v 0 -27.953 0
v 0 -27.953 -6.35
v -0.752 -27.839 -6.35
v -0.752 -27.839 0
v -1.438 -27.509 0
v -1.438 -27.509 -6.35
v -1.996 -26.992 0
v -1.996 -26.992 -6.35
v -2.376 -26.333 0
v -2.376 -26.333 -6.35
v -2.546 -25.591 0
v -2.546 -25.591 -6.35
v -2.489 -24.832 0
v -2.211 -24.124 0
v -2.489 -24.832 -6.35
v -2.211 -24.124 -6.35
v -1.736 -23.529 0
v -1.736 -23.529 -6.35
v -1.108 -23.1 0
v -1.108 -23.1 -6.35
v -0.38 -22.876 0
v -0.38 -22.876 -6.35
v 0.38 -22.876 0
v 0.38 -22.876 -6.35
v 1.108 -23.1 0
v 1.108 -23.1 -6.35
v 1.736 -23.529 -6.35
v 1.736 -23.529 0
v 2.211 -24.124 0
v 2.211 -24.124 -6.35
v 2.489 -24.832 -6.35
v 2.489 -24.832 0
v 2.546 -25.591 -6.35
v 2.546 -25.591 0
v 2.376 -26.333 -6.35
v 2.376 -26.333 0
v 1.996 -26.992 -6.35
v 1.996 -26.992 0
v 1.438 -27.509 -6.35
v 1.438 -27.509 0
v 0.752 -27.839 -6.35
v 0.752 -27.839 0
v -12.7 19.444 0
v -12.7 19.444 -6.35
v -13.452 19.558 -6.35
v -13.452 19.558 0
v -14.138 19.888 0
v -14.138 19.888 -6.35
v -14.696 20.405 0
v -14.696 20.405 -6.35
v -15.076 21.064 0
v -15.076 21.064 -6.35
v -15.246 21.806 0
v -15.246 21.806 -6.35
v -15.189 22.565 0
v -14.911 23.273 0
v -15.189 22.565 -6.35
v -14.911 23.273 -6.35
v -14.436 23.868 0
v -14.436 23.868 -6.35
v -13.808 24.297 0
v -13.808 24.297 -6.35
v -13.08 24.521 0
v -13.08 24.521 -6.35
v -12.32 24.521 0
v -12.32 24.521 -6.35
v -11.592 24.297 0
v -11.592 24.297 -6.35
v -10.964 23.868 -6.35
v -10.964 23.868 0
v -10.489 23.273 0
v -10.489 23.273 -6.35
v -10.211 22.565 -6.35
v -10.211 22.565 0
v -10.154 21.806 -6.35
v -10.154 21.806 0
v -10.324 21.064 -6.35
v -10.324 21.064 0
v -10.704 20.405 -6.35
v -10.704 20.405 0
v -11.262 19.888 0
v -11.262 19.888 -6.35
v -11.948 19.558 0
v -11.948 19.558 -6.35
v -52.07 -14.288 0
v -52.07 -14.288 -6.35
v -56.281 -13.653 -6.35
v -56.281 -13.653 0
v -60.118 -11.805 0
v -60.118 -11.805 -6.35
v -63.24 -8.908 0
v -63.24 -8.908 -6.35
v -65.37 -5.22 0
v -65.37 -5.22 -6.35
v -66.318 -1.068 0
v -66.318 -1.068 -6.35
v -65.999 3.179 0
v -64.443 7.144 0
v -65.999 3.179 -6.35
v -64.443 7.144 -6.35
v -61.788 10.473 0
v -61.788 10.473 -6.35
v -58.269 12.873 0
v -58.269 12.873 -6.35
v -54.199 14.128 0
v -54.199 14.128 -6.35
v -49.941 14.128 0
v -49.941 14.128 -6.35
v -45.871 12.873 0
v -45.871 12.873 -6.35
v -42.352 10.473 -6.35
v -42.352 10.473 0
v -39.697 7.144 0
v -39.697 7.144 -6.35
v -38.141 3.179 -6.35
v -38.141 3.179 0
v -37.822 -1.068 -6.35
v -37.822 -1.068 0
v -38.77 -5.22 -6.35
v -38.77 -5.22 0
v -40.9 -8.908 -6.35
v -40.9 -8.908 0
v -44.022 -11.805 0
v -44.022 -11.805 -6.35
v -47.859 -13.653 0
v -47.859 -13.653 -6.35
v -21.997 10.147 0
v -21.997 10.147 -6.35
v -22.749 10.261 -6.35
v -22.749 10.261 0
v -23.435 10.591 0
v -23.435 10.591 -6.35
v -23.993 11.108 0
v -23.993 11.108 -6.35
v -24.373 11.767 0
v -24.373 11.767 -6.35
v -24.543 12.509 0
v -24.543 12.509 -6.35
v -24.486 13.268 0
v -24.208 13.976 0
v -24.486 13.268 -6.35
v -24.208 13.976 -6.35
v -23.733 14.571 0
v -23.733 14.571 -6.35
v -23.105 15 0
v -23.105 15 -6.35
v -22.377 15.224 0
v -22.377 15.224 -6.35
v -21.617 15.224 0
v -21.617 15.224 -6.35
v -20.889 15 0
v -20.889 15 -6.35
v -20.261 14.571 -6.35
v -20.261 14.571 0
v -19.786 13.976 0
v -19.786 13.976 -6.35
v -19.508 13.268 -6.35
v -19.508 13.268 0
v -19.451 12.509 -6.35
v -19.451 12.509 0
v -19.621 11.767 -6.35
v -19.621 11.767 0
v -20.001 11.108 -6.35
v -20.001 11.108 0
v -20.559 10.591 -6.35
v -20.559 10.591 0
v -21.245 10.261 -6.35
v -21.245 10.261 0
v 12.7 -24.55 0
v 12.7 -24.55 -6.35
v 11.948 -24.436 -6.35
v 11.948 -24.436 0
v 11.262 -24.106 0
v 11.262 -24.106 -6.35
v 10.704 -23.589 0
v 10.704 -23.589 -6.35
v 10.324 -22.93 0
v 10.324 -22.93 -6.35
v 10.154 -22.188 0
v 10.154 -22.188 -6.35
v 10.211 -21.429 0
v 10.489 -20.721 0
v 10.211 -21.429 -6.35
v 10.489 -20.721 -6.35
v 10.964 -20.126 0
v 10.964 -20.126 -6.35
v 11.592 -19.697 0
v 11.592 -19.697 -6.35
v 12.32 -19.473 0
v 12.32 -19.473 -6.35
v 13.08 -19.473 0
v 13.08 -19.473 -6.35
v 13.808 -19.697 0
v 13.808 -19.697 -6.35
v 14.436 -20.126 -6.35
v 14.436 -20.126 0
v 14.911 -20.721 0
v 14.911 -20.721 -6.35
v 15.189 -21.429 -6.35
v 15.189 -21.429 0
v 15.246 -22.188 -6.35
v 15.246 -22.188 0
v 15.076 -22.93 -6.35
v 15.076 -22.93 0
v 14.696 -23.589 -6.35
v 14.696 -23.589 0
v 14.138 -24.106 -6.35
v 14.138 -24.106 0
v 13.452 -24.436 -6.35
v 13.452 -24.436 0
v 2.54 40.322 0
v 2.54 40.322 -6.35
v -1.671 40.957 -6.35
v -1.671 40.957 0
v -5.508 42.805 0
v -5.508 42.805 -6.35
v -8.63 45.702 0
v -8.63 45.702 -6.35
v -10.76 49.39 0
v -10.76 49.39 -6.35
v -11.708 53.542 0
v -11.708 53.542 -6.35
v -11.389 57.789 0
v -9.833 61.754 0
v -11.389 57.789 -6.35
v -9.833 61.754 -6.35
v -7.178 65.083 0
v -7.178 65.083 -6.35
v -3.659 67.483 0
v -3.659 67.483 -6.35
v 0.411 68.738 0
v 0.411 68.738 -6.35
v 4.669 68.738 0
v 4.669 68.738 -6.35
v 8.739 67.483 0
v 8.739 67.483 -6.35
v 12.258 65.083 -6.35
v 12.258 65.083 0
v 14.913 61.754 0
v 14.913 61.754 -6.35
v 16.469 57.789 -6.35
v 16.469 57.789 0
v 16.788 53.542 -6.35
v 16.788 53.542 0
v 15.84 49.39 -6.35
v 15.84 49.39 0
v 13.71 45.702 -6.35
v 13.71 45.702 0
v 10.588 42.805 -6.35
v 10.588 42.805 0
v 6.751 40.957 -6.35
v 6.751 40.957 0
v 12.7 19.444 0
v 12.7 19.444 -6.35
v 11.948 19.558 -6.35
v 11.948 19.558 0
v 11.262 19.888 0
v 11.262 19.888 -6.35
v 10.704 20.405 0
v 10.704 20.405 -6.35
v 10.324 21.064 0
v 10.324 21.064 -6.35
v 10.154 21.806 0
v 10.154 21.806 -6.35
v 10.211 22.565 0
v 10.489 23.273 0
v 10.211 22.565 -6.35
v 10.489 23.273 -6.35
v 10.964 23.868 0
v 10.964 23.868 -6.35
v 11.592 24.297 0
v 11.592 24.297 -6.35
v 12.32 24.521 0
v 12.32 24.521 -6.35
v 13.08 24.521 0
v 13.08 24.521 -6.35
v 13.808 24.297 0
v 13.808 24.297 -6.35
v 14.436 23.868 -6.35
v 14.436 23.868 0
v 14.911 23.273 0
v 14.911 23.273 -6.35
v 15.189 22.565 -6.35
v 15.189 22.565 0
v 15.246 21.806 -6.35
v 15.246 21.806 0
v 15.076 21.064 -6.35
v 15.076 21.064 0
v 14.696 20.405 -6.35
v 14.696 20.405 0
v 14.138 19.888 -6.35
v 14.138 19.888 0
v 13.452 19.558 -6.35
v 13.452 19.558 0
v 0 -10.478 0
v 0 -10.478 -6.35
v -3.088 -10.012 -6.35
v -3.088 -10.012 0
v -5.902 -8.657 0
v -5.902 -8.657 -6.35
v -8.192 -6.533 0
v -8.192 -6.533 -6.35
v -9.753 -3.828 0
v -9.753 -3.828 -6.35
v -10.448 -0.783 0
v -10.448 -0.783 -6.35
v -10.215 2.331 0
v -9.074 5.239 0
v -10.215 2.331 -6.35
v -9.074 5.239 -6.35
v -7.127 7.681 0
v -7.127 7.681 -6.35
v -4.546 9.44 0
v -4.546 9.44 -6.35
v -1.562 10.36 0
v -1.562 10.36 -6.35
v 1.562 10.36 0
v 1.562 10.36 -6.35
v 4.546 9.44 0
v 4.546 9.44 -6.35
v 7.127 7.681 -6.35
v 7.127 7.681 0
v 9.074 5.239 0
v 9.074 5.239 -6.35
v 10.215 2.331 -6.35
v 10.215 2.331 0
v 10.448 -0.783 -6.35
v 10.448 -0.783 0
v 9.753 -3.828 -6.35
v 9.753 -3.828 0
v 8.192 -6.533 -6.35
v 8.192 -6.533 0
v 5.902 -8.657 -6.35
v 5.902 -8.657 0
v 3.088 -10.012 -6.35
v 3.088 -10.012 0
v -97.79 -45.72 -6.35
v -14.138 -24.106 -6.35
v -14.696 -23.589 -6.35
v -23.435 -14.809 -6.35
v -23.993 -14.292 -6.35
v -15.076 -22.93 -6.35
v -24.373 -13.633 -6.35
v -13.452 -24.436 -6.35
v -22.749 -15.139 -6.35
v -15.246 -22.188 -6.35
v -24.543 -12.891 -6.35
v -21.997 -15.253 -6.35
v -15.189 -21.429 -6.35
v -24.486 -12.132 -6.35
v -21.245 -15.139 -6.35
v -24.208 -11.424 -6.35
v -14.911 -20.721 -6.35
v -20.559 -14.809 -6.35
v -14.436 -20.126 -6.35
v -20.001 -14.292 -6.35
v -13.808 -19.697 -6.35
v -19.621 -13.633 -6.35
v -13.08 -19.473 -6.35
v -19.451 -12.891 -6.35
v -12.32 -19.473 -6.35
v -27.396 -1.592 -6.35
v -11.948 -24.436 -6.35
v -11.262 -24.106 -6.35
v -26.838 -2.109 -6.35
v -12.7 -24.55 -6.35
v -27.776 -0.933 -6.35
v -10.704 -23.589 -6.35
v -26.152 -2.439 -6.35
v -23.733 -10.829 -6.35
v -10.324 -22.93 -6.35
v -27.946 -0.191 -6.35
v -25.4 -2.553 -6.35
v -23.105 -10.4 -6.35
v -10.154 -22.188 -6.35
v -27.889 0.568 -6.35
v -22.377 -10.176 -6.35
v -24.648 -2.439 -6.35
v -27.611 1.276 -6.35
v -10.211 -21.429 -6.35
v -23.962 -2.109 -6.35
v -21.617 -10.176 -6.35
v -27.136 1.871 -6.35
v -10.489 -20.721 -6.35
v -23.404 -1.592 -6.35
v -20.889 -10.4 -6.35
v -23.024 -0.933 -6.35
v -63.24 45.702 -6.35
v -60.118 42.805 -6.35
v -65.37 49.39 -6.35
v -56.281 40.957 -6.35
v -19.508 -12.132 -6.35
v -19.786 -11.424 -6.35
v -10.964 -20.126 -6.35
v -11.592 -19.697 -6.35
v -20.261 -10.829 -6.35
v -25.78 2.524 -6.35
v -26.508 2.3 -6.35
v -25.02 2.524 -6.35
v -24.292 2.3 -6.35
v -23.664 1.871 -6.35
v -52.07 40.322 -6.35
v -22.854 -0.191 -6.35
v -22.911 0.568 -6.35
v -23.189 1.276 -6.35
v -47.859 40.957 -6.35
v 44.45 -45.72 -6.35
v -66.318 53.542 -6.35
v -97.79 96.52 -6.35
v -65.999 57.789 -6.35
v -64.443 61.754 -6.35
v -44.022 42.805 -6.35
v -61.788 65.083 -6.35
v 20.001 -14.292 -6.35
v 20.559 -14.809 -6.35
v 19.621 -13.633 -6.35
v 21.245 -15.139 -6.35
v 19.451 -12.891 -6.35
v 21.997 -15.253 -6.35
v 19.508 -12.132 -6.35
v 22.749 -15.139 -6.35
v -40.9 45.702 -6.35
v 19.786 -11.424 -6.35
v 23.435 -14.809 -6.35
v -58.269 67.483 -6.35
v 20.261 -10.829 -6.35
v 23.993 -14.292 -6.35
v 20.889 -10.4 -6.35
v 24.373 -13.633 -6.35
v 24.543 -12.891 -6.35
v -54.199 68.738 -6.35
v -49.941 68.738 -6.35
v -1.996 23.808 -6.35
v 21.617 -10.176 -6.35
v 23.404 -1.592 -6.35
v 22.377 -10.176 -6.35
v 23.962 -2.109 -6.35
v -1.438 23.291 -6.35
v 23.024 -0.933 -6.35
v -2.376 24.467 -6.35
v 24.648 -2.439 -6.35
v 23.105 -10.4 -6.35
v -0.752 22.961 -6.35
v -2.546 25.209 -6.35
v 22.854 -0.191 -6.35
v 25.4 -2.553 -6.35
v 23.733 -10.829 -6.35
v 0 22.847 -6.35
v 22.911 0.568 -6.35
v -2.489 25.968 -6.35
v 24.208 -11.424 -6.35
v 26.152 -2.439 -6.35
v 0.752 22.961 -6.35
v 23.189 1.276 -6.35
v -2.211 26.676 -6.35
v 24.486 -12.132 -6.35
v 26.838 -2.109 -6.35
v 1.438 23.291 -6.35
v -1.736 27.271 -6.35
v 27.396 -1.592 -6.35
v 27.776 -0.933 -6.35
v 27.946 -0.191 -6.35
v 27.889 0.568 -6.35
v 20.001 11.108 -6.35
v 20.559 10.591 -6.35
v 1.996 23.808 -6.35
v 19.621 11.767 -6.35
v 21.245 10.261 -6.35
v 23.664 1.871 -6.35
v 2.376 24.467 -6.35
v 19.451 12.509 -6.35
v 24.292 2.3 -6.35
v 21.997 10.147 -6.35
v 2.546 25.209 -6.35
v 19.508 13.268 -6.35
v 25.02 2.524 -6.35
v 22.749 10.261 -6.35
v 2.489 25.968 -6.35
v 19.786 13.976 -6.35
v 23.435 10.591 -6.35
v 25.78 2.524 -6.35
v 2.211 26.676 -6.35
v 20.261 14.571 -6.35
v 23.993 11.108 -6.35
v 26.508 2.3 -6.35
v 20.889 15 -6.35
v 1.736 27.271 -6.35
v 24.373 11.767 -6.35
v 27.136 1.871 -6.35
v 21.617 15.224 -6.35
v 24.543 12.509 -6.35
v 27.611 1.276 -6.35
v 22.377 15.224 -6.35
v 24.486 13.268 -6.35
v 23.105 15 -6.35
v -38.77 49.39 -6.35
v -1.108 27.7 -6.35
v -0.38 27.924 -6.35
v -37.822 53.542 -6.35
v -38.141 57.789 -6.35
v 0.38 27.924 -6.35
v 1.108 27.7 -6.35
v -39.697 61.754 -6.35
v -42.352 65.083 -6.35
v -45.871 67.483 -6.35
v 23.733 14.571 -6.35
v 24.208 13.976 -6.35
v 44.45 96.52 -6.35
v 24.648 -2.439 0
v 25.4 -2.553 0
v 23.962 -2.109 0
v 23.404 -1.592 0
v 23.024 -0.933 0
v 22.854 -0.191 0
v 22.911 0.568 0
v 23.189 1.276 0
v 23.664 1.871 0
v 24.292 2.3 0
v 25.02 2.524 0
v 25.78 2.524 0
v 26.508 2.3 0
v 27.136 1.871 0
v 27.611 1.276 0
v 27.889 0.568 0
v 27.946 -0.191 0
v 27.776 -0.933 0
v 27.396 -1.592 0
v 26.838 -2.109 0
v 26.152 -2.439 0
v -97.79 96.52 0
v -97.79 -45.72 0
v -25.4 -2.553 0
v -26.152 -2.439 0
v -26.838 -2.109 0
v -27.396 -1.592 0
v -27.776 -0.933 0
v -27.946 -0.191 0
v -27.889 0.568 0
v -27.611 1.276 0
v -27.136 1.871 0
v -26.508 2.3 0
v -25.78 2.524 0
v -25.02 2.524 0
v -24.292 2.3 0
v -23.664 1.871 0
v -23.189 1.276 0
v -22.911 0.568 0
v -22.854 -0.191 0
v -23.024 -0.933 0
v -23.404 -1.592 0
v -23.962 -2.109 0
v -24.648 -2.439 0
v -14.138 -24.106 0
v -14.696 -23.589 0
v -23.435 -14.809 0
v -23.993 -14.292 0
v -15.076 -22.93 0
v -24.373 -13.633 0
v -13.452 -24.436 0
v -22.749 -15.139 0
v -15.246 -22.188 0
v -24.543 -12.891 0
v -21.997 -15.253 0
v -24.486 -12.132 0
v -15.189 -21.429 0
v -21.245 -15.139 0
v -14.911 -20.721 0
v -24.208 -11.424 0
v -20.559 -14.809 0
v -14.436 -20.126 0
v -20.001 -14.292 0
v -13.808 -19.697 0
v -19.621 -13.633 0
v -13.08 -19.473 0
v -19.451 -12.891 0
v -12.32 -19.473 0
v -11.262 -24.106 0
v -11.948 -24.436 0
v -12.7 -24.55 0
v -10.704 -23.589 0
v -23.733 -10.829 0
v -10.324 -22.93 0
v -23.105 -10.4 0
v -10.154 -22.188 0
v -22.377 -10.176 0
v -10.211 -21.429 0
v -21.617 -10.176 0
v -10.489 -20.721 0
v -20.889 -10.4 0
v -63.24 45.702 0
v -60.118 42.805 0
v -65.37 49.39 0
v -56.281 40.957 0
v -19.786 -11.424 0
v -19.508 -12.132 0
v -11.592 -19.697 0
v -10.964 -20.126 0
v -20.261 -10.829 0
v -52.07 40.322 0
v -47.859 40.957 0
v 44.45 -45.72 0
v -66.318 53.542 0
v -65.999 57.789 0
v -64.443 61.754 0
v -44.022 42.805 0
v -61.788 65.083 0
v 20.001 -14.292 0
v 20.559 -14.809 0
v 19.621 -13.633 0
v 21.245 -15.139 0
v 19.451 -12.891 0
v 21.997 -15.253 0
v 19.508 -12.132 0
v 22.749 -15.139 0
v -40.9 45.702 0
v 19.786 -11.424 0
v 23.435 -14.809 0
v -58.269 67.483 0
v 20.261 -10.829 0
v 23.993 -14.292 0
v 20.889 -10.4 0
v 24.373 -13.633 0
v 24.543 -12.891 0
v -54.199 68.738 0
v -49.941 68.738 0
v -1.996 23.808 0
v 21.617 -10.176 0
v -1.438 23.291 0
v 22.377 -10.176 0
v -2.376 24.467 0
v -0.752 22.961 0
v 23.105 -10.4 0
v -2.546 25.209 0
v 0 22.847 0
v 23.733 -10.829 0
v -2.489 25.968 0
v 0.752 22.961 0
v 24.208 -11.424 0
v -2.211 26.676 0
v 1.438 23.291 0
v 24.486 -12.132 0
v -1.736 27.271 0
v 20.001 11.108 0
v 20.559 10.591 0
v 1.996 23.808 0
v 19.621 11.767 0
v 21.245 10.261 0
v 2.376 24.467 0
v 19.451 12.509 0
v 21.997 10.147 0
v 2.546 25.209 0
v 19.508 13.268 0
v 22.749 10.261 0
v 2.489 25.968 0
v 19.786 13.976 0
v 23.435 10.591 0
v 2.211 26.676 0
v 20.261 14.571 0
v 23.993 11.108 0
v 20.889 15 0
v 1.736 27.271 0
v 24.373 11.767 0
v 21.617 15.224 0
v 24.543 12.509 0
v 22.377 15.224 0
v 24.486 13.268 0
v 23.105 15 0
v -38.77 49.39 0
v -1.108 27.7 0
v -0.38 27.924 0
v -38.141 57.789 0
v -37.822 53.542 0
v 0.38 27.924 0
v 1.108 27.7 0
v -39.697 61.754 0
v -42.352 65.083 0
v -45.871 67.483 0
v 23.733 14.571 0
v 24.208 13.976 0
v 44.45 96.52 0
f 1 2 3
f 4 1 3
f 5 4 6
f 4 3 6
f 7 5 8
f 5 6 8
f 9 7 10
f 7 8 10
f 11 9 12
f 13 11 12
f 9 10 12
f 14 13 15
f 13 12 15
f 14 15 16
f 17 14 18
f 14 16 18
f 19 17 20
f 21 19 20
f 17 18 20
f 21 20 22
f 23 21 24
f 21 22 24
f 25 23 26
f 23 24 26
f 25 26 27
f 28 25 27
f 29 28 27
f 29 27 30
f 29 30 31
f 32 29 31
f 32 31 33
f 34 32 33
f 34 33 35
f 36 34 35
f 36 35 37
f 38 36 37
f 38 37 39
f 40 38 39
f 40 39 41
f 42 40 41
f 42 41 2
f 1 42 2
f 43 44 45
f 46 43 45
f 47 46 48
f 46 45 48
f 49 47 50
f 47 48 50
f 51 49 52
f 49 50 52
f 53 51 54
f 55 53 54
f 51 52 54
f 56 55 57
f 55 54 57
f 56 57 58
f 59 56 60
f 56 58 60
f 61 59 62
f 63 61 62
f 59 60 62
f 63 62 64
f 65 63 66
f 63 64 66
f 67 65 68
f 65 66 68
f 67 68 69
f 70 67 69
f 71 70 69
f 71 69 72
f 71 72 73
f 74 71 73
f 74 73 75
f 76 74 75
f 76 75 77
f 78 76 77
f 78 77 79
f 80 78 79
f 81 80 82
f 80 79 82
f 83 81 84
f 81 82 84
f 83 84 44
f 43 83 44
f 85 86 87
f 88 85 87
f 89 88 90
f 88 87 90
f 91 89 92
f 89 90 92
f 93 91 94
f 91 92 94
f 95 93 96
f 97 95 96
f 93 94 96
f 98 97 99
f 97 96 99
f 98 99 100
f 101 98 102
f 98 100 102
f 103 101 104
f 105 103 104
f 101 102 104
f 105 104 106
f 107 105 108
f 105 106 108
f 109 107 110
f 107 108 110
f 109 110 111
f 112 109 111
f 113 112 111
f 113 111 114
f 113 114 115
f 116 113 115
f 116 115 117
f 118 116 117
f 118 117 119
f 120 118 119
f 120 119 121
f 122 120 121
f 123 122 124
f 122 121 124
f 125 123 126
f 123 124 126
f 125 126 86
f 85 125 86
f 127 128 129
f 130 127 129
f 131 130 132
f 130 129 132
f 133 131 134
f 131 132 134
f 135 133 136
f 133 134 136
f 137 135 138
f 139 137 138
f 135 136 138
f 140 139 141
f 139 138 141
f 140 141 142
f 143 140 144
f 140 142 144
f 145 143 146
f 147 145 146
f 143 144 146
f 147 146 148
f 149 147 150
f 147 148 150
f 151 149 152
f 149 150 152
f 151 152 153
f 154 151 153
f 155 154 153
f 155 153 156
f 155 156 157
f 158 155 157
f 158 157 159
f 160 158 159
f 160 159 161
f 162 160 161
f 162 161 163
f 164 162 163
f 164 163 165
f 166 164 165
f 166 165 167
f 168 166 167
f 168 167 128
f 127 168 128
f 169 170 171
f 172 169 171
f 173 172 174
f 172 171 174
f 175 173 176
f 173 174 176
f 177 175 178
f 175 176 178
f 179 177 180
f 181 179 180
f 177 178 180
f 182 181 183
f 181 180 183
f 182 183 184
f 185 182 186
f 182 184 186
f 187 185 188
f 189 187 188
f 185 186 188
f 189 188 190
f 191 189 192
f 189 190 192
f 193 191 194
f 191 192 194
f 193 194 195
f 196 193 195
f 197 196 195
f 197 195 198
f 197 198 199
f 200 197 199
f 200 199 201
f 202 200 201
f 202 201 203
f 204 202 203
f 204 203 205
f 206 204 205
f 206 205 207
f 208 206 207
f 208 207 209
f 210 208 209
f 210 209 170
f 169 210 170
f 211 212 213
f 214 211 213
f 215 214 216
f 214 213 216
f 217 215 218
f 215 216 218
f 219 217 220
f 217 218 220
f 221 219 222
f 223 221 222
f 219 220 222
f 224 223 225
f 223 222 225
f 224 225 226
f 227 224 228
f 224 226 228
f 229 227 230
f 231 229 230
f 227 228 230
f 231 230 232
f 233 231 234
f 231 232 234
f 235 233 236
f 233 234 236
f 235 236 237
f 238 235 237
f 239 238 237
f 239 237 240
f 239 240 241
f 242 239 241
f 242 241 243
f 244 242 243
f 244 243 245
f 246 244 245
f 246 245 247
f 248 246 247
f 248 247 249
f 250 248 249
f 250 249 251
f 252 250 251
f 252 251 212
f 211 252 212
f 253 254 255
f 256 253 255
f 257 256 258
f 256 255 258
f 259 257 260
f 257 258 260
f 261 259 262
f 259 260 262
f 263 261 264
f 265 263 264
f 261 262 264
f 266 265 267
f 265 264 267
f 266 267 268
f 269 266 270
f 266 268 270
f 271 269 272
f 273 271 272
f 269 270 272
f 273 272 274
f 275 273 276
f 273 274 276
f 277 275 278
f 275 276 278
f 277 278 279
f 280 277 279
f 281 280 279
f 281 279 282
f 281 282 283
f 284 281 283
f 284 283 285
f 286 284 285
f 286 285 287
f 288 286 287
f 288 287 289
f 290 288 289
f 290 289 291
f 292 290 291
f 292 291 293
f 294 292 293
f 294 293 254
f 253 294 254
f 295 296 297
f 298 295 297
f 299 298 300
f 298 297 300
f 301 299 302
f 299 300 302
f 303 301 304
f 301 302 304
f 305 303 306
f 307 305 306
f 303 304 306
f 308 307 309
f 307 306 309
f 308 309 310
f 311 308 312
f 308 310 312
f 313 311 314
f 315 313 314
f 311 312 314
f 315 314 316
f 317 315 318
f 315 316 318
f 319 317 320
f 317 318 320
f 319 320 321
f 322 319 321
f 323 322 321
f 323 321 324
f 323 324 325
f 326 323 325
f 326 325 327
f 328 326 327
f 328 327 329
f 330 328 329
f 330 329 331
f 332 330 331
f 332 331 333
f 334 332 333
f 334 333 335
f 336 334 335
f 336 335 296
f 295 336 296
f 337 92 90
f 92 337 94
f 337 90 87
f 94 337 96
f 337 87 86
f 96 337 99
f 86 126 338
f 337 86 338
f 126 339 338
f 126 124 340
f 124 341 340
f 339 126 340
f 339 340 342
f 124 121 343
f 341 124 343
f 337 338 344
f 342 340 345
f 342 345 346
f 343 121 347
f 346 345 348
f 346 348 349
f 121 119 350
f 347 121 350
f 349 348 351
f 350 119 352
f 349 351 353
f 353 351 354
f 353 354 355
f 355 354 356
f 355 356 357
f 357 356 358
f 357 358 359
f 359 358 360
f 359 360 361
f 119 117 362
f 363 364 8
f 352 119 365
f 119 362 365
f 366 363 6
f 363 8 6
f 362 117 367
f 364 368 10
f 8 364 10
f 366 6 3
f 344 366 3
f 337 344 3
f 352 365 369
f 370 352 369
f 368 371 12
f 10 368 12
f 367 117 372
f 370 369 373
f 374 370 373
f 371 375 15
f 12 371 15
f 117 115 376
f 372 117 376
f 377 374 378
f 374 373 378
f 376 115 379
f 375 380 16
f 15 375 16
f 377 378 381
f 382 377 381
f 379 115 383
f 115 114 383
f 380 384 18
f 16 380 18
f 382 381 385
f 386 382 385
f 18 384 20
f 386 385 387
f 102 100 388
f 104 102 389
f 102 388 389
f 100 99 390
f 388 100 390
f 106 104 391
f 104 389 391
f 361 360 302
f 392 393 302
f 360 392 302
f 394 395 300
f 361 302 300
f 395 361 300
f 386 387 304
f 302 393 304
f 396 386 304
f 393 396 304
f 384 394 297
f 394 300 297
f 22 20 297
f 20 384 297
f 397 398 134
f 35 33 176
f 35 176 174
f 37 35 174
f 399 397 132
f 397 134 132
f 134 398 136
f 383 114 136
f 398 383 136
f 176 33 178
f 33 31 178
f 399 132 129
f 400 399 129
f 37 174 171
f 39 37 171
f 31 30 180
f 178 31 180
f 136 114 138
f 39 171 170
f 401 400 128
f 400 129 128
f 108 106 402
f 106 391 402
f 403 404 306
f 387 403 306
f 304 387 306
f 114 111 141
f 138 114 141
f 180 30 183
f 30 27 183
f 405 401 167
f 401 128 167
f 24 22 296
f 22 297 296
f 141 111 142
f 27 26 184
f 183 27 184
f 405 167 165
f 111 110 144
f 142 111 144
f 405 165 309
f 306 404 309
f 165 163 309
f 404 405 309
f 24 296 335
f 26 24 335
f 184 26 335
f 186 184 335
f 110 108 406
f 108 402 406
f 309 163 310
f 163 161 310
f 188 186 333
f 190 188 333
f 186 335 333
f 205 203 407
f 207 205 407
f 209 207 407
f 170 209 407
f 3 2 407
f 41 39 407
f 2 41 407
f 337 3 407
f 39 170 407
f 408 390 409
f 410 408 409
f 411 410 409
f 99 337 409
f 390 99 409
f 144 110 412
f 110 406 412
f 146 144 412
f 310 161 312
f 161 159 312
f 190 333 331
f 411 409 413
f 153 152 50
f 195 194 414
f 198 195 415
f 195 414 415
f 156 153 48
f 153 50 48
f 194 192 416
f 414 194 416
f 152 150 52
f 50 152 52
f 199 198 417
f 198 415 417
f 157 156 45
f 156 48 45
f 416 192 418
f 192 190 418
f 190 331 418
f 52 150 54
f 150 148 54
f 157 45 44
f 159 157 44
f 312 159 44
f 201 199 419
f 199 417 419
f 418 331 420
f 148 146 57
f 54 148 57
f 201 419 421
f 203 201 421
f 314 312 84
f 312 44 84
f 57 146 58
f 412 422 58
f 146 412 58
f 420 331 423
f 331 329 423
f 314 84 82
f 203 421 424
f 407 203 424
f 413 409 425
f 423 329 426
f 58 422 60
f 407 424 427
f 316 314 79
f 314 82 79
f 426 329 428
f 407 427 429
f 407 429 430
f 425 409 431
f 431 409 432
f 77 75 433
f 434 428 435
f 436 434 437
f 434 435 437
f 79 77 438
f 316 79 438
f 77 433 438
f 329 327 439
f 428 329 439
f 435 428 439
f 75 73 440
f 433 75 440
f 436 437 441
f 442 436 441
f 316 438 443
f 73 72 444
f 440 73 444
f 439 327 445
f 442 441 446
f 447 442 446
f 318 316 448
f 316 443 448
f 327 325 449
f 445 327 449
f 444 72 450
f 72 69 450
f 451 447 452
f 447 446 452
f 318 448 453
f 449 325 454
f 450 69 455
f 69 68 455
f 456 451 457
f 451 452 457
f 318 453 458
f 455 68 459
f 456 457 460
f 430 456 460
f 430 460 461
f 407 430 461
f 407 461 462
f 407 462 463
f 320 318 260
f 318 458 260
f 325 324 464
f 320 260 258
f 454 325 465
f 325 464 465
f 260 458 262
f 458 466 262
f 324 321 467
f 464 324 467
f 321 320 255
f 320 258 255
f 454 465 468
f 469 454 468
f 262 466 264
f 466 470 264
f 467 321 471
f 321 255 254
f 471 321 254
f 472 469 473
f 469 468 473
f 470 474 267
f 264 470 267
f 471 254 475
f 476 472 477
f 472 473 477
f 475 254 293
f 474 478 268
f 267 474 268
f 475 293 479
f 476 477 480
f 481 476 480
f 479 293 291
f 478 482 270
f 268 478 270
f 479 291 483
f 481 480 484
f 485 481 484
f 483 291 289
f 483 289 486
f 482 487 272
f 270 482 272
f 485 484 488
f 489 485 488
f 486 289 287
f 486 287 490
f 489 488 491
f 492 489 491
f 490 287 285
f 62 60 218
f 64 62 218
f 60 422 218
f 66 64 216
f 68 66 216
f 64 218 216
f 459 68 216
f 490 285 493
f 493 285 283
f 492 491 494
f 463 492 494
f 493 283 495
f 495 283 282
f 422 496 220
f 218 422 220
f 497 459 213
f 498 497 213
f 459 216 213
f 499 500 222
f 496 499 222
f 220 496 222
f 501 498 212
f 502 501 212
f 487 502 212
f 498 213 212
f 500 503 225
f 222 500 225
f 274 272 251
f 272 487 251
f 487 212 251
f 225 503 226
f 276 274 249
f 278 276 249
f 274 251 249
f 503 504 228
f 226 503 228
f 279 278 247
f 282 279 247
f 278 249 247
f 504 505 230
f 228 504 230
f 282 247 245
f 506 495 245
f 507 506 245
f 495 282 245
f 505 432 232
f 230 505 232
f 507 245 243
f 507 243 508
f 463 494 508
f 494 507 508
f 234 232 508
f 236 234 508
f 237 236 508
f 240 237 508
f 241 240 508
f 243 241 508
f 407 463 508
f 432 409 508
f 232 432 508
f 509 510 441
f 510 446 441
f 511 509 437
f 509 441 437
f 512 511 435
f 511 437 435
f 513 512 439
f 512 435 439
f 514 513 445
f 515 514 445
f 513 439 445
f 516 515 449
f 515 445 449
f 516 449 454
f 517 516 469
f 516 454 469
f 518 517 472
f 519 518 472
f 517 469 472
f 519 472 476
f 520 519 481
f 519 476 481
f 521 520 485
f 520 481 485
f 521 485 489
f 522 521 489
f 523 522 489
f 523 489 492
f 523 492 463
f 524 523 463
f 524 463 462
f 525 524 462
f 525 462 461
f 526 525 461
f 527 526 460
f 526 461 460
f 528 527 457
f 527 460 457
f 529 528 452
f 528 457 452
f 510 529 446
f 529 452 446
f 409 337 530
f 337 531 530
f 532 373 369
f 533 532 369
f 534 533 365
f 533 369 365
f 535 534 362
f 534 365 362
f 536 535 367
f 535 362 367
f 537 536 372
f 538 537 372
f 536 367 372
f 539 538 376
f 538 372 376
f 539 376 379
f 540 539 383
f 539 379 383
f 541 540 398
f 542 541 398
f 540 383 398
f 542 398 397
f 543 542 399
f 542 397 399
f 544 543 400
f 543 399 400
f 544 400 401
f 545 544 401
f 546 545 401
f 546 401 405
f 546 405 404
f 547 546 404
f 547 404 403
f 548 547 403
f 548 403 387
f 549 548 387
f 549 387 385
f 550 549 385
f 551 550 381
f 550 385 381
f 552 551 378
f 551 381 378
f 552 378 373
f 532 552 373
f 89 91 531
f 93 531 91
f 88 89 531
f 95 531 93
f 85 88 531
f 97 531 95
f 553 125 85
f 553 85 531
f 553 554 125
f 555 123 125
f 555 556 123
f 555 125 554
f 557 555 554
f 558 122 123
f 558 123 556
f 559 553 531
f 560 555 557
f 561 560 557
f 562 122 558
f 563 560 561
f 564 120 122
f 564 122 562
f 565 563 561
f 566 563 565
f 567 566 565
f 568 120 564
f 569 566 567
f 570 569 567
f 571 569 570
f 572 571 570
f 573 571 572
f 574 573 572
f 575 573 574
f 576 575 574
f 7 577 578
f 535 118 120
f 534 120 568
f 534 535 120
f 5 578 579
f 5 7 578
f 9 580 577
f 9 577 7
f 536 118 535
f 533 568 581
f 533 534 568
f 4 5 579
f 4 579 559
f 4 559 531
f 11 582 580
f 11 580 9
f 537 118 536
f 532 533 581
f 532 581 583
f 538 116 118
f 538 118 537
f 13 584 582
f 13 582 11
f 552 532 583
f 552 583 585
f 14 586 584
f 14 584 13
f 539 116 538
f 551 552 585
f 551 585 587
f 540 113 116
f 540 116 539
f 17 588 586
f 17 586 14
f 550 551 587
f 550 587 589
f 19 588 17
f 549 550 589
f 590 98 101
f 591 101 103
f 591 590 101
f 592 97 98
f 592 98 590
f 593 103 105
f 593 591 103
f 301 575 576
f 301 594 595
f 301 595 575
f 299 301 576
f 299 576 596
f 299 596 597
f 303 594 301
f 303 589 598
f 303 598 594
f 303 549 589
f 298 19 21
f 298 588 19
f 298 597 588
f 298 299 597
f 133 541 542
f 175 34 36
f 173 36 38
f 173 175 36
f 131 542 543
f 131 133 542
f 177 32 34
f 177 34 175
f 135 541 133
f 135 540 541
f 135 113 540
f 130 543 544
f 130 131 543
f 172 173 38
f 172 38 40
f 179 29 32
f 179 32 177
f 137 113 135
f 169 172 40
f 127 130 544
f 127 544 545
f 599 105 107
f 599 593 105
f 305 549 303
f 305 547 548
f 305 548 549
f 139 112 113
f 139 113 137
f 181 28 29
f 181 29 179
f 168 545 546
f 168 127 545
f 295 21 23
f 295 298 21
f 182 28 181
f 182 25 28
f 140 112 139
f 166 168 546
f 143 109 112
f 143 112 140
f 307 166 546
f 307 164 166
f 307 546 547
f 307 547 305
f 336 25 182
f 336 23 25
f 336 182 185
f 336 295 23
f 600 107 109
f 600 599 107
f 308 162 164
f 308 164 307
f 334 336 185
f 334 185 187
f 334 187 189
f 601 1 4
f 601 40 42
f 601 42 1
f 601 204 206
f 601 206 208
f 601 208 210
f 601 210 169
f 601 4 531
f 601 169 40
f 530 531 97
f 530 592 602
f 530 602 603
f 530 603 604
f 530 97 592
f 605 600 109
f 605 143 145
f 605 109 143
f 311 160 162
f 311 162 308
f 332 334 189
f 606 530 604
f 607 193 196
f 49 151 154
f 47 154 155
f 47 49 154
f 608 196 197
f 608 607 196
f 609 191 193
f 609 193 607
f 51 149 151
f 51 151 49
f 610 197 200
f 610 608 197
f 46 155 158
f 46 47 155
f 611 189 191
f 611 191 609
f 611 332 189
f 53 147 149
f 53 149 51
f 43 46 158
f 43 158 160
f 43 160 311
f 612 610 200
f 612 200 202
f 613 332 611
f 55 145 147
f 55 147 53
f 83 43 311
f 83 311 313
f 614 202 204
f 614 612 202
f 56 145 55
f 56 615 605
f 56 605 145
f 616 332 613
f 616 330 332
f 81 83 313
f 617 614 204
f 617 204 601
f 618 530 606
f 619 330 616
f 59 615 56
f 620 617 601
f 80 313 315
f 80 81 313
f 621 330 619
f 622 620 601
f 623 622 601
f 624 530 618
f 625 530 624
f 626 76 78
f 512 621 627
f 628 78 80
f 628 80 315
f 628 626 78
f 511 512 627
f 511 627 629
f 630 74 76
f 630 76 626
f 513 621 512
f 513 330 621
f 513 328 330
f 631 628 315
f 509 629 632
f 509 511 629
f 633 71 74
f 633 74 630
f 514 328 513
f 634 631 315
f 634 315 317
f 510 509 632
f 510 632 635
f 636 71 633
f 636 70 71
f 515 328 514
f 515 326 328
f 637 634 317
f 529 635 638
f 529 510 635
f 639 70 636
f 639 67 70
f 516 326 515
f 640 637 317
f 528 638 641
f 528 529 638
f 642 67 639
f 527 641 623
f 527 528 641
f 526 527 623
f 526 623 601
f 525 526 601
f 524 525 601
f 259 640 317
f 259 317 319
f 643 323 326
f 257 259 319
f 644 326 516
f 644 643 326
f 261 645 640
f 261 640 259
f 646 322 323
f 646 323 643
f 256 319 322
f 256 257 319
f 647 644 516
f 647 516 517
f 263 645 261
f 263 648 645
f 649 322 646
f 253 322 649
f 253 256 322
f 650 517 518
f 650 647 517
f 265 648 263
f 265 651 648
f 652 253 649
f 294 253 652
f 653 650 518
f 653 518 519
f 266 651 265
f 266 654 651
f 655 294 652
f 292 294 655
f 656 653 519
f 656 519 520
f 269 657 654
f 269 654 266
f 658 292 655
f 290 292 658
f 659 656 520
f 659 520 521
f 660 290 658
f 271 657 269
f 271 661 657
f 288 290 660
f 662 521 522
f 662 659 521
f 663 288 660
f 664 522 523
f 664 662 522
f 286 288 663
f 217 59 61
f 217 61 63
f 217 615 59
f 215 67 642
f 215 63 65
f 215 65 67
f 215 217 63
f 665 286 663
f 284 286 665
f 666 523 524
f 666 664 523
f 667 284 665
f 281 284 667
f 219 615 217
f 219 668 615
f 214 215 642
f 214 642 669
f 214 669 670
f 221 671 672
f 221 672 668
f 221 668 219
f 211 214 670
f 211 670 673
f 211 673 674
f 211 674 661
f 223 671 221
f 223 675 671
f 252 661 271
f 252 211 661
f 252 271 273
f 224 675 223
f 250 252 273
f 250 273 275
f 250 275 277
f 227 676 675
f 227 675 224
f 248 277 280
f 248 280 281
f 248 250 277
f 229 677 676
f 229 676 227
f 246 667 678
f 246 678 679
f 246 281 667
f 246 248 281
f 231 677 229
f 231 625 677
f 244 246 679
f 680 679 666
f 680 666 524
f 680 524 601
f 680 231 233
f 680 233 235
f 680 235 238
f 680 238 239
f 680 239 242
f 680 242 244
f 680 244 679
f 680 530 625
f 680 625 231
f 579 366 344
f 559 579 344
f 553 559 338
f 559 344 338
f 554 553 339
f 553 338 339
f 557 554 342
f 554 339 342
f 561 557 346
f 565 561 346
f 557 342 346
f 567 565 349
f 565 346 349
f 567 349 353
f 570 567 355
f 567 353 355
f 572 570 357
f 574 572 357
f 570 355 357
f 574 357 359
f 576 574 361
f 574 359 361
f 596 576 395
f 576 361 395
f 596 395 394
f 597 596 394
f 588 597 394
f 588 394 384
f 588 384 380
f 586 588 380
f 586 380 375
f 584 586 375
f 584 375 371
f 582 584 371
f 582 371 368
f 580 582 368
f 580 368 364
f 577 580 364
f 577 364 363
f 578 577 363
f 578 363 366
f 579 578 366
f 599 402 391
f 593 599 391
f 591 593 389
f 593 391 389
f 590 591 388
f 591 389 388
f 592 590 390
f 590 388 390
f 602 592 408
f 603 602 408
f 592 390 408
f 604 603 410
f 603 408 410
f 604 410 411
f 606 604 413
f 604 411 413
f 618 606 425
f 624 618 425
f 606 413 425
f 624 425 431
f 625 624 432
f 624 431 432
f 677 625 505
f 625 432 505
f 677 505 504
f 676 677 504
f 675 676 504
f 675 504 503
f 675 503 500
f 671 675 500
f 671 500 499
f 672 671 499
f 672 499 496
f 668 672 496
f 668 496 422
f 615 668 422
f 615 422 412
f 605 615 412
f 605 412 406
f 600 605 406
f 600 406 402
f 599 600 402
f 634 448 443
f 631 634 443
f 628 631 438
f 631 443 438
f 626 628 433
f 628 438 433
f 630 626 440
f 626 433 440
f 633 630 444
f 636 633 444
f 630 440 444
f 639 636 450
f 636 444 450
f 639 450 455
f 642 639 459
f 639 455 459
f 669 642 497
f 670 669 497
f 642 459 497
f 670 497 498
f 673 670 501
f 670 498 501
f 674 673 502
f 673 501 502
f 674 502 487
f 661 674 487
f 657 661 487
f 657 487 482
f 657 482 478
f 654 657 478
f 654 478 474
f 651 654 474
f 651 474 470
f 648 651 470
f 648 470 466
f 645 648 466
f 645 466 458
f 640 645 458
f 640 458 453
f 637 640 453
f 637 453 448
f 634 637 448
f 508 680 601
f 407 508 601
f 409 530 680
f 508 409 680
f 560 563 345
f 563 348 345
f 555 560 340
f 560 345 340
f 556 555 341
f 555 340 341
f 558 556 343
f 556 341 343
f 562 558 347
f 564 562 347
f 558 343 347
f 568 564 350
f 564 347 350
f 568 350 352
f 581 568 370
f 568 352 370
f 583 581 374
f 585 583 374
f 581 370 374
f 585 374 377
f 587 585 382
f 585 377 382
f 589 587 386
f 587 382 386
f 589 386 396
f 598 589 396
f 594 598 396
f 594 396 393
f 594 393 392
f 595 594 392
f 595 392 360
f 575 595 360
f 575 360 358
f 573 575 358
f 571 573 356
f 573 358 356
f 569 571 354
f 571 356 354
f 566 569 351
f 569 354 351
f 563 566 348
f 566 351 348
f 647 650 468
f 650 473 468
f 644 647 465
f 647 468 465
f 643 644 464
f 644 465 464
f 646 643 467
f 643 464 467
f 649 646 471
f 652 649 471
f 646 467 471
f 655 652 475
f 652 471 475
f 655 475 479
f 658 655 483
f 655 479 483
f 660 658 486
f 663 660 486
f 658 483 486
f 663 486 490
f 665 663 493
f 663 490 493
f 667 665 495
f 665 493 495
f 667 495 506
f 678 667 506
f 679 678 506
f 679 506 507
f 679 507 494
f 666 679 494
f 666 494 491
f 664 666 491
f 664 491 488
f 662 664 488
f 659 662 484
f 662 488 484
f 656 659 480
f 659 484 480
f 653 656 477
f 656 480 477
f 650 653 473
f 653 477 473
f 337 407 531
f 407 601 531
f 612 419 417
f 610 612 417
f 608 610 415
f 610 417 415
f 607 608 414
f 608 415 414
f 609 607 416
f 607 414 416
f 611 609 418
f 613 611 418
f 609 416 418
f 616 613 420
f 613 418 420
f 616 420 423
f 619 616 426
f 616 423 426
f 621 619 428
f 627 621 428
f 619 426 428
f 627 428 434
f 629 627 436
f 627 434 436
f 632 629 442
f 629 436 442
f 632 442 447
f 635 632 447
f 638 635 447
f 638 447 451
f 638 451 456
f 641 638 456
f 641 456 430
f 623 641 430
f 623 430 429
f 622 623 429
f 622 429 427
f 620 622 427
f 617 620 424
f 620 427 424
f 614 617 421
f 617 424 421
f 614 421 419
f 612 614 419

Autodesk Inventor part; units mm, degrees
ref_plane "YZ Plane" through (0, 0, 0) normal (1, 0, 0) x (0, 1, 0)
ref_plane "XZ Plane" through (0, 0, 0) normal (0, 1, 0) x (-1, 0, 0)
ref_plane "XY Plane" through (0, 0, 0) normal (0, 0, 1) x (1, 0, 0)
sketch "Sketch1" plane through (0, 0, 0) normal (0, 0, 1) x (1, 0, 0)
  circle A0 centre (0, 0) radius 6.35 construction
  circle A1 centre (-52.07, 0) radius 45.72 construction
  circle A2 centre (-52.07, 0) radius 12.7 construction
  circle A3 centre (-52.07, 54.61) radius 41.91 construction
  circle A4 centre (-52.07, 54.61) radius 12.7 construction
  circle A5 centre (2.54, 54.61) radius 41.91 construction
  line L0 (-97.79, 96.52) -> (44.45, 96.52)
  line L1 (44.45, 96.52) -> (44.45, -45.72)
  line L2 (44.45, -45.72) -> (-97.79, -45.72)
  line L3 (-97.79, -45.72) -> (-97.79, 96.52)
  circle A6 centre (0, 0) radius 25.4 construction
  point P0 (25.4, 0)
  point P1 (21.997, 12.7)
  point P2 (12.7, 21.997)
  point P3 (0, 25.4)
  point P4 (-12.7, 21.997)
  point P5 (-21.997, 12.7)
  point P6 (-25.4, 0)
  point P7 (-21.997, -12.7)
  point P8 (-12.7, -21.997)
  point P9 (0, -25.4)
  point P10 (12.7, -21.997)
  point P11 (21.997, -12.7)
  dimension "d15" = 50.8
  dimension "d0" = 12.7
  dimension "d1" = 91.44
  dimension "d2" = 25.4
  dimension "d3" = 83.82
  dimension "d4" = 25.4
  dimension "d5" = 83.82
  dimension "d18" = 360
extrude "Extrusion1" add sketch "Sketch1" against normal blind 6.35
hole "Hole1" at (-52.07, 0, 0) at (2.54, 54.61, 0) at (-52.07, 54.61, 0) direction (0, 0, -1) diameter 28.575 end through all
hole "Hole2" at (25.4, 0, 0) at (21.997, 12.7, 0) at (12.7, 21.997, 0) at (0, 25.4, 0) at (-12.7, 21.997, 0) at (-21.997, 12.7, 0) at (-25.4, 0, 0) at (-21.997, -12.7, 0) at (-12.7, -21.997, 0) at (0, -25.4, 0) at (12.7, -21.997, 0) at (21.997, -12.7, 0) direction (0, 0, -1) diameter 5.1054 end through all clearance for "Flat Head Machine Screw (82)" size "#10" standard "Ansi Unified Screw Threads"
hole "Hole3" at (0, 0, 0) direction (0, 0, -1) diameter 20.955 end through all
properties part number "CL4-014" material "Aluminum 6061"
